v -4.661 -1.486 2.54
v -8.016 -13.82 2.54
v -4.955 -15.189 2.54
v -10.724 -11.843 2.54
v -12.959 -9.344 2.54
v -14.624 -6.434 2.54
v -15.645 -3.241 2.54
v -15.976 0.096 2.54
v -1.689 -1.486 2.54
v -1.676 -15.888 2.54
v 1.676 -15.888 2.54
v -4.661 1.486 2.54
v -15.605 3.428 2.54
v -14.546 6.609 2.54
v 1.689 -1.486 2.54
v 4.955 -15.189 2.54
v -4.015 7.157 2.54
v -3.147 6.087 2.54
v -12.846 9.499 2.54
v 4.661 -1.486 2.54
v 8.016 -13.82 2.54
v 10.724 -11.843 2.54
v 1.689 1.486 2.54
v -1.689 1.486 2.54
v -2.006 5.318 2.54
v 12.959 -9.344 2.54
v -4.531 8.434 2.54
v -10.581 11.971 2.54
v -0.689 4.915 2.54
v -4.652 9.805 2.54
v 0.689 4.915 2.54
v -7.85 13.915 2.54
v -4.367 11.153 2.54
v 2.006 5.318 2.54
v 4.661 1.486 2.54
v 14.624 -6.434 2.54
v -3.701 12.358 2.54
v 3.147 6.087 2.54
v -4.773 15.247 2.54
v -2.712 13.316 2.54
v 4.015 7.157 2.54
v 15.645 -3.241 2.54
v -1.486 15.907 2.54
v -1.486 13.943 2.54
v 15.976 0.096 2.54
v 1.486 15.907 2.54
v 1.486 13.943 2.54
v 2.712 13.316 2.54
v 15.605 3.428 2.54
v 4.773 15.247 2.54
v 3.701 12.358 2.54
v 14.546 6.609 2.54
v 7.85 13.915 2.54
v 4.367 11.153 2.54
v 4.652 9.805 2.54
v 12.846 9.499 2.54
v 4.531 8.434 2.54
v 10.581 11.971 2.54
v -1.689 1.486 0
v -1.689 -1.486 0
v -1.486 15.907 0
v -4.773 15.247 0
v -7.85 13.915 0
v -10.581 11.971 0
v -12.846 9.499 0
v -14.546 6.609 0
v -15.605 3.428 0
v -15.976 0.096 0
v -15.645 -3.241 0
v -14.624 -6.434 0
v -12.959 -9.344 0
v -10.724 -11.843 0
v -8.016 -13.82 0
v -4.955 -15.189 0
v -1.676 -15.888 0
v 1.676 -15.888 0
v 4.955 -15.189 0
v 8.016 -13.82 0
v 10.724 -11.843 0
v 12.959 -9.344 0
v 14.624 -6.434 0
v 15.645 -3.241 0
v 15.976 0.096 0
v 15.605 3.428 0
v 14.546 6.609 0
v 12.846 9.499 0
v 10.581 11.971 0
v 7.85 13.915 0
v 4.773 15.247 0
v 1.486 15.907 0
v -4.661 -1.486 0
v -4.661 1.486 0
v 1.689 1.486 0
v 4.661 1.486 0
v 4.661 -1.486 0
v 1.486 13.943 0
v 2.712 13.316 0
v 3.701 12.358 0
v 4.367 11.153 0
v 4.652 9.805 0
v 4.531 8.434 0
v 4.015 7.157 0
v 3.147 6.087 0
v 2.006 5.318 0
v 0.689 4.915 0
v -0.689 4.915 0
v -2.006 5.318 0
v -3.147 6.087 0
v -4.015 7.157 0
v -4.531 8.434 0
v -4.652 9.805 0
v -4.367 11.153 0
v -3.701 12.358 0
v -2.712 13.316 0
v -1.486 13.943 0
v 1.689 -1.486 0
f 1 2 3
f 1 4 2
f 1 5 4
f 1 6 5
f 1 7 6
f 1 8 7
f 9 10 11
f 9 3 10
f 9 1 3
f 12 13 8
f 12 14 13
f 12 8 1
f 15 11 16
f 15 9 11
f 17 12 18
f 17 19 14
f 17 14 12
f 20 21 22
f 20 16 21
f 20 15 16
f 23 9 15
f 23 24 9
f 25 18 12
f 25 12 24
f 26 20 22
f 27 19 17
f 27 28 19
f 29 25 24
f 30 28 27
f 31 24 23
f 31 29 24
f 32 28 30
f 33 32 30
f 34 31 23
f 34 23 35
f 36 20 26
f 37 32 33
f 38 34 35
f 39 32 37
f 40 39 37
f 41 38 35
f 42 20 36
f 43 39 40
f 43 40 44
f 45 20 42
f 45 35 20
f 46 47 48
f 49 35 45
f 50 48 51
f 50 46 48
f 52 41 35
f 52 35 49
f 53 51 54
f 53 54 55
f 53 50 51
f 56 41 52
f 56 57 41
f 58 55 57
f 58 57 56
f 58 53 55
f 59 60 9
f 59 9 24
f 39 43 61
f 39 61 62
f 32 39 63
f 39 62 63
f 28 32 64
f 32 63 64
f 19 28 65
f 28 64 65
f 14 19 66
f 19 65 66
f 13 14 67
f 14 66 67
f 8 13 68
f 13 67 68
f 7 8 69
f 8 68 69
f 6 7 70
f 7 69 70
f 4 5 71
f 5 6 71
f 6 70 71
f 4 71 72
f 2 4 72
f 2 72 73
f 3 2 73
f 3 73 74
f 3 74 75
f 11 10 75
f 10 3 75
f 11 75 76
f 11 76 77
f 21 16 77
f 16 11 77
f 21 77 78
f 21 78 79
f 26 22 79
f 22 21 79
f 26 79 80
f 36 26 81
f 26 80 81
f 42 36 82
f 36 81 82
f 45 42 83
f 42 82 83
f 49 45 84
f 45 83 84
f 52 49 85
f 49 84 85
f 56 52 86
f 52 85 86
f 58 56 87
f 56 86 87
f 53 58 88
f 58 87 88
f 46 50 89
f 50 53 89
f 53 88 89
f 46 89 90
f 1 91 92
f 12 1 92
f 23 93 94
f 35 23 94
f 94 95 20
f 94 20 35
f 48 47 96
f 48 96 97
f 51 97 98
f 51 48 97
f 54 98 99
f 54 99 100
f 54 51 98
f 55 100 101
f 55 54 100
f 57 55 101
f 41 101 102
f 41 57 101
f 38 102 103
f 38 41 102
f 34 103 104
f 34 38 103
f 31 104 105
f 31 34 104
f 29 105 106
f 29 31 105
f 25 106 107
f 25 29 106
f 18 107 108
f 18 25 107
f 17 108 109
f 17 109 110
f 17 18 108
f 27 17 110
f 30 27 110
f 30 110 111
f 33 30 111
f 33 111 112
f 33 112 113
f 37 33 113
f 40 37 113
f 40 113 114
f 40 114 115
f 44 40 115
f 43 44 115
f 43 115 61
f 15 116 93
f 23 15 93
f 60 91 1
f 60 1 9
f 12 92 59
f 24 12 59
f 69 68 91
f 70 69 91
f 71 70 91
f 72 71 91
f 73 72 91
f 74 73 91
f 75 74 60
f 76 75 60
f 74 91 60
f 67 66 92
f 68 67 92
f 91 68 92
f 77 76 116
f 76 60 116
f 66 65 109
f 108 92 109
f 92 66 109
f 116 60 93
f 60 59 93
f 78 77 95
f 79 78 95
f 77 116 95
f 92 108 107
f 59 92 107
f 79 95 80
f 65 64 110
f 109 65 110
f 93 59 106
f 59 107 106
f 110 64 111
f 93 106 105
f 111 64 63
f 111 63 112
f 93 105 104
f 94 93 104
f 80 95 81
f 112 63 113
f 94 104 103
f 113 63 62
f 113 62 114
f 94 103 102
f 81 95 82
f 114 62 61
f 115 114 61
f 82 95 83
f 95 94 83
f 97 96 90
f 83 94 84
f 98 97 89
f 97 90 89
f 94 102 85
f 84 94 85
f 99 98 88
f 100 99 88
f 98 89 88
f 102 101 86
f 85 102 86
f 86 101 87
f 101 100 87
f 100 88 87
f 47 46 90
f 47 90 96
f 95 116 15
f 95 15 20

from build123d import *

# Parameters (mm, degrees)
SKETCH1_R           = 15.9766
SKETCH1_W           = 2.9718
SKETCH1_H           = 2.9718
BOSS_EXTRUDE1_DEPTH = 2.54
CUT_EXTRUDE1_DEPTH  = 2.54


with BuildPart() as part:
    # Sketch1 → Boss-Extrude1 (new body)
    with BuildSketch(Plane.XY):
        Circle(SKETCH1_R)
        with Locations((-3.175, 0)):
            Rectangle(SKETCH1_W, SKETCH1_H, mode=Mode.SUBTRACT)
        with Locations((3.175, 0)):
            Rectangle(SKETCH1_W, SKETCH1_H, mode=Mode.SUBTRACT)
    extrude(amount=BOSS_EXTRUDE1_DEPTH)

    # Sketch2 → Cut-Extrude1 (cut)
    with BuildSketch(Plane.XY.offset(2.54)):
        with BuildLine():
            Line((-1.4859, 13.942701891), (-1.4859, 18.9484))
            Line((-1.4859, 18.9484), (1.4859, 18.9484))
            Line((1.4859, 18.9484), (1.4859, 13.942701891))
            ThreePointArc((1.4859, 13.942701891), (0, 4.8641), (-1.4859, 13.942701891))
        make_face()
    extrude(amount=-CUT_EXTRUDE1_DEPTH, mode=Mode.SUBTRACT)


solid = part.part
